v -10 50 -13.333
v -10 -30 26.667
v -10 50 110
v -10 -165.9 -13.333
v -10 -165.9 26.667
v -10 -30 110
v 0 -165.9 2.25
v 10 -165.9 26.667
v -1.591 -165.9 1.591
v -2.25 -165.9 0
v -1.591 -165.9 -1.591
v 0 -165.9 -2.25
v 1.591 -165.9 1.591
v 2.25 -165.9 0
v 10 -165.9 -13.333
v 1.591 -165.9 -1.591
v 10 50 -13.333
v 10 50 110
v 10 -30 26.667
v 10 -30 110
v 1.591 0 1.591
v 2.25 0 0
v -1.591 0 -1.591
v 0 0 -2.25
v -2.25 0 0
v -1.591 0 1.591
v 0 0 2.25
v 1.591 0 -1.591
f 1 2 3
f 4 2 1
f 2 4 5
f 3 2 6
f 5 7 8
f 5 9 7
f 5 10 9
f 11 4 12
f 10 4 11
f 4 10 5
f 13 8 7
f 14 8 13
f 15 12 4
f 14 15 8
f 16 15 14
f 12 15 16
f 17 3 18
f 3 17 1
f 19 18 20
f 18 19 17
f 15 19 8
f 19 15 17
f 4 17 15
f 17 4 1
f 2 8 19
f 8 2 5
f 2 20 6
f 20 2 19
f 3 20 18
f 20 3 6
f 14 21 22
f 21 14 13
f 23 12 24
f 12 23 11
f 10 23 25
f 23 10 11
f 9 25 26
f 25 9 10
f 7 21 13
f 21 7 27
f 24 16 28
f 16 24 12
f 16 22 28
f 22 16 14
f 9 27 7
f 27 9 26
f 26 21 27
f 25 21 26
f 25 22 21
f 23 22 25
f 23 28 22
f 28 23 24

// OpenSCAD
tank_gun(8.5*25.4);

module tank_gun(length)
{
    outer_diameter = 9;
    inner_diameter = 4.5;
    
    receiver_width = 20;
    receiver_length = 40;
    receiver_height = length;
    receiver_width_offset = -(receiver_width / 2);
    receiver_length_offset = -(receiver_length / 1.5);
    receiver_height_offset = 0;
    
    grip_width = receiver_width;
    grip_length = 100;
    grip_height = 80;
    grip_width_offset = -(grip_width / 2);
    grip_length_offset = -grip_length + receiver_width_offset;
    grip_height_offset = 0;
    
    assembly_width_offset = 0;
    assembly_length_offset = 0;
    assembly_height_offset = -50;    
    
    rotate([90, 180, 0])
    difference()
    {
        translate([assembly_width_offset, assembly_length_offset, assembly_height_offset])
        union()
        {
            color("black", 1.0)
            translate([receiver_width_offset, receiver_length_offset, receiver_height_offset])
            cube([receiver_width, receiver_length, receiver_height], false);

            color("black", 1.0)
            translate([grip_width_offset, grip_length_offset, grip_height_offset])
            cube([grip_width, grip_length, grip_height], false);

            color("beige", 1.0)
            cylinder(length, d = outer_diameter, true);
        }
        cylinder(length, d = inner_diameter, true);
    }
}
